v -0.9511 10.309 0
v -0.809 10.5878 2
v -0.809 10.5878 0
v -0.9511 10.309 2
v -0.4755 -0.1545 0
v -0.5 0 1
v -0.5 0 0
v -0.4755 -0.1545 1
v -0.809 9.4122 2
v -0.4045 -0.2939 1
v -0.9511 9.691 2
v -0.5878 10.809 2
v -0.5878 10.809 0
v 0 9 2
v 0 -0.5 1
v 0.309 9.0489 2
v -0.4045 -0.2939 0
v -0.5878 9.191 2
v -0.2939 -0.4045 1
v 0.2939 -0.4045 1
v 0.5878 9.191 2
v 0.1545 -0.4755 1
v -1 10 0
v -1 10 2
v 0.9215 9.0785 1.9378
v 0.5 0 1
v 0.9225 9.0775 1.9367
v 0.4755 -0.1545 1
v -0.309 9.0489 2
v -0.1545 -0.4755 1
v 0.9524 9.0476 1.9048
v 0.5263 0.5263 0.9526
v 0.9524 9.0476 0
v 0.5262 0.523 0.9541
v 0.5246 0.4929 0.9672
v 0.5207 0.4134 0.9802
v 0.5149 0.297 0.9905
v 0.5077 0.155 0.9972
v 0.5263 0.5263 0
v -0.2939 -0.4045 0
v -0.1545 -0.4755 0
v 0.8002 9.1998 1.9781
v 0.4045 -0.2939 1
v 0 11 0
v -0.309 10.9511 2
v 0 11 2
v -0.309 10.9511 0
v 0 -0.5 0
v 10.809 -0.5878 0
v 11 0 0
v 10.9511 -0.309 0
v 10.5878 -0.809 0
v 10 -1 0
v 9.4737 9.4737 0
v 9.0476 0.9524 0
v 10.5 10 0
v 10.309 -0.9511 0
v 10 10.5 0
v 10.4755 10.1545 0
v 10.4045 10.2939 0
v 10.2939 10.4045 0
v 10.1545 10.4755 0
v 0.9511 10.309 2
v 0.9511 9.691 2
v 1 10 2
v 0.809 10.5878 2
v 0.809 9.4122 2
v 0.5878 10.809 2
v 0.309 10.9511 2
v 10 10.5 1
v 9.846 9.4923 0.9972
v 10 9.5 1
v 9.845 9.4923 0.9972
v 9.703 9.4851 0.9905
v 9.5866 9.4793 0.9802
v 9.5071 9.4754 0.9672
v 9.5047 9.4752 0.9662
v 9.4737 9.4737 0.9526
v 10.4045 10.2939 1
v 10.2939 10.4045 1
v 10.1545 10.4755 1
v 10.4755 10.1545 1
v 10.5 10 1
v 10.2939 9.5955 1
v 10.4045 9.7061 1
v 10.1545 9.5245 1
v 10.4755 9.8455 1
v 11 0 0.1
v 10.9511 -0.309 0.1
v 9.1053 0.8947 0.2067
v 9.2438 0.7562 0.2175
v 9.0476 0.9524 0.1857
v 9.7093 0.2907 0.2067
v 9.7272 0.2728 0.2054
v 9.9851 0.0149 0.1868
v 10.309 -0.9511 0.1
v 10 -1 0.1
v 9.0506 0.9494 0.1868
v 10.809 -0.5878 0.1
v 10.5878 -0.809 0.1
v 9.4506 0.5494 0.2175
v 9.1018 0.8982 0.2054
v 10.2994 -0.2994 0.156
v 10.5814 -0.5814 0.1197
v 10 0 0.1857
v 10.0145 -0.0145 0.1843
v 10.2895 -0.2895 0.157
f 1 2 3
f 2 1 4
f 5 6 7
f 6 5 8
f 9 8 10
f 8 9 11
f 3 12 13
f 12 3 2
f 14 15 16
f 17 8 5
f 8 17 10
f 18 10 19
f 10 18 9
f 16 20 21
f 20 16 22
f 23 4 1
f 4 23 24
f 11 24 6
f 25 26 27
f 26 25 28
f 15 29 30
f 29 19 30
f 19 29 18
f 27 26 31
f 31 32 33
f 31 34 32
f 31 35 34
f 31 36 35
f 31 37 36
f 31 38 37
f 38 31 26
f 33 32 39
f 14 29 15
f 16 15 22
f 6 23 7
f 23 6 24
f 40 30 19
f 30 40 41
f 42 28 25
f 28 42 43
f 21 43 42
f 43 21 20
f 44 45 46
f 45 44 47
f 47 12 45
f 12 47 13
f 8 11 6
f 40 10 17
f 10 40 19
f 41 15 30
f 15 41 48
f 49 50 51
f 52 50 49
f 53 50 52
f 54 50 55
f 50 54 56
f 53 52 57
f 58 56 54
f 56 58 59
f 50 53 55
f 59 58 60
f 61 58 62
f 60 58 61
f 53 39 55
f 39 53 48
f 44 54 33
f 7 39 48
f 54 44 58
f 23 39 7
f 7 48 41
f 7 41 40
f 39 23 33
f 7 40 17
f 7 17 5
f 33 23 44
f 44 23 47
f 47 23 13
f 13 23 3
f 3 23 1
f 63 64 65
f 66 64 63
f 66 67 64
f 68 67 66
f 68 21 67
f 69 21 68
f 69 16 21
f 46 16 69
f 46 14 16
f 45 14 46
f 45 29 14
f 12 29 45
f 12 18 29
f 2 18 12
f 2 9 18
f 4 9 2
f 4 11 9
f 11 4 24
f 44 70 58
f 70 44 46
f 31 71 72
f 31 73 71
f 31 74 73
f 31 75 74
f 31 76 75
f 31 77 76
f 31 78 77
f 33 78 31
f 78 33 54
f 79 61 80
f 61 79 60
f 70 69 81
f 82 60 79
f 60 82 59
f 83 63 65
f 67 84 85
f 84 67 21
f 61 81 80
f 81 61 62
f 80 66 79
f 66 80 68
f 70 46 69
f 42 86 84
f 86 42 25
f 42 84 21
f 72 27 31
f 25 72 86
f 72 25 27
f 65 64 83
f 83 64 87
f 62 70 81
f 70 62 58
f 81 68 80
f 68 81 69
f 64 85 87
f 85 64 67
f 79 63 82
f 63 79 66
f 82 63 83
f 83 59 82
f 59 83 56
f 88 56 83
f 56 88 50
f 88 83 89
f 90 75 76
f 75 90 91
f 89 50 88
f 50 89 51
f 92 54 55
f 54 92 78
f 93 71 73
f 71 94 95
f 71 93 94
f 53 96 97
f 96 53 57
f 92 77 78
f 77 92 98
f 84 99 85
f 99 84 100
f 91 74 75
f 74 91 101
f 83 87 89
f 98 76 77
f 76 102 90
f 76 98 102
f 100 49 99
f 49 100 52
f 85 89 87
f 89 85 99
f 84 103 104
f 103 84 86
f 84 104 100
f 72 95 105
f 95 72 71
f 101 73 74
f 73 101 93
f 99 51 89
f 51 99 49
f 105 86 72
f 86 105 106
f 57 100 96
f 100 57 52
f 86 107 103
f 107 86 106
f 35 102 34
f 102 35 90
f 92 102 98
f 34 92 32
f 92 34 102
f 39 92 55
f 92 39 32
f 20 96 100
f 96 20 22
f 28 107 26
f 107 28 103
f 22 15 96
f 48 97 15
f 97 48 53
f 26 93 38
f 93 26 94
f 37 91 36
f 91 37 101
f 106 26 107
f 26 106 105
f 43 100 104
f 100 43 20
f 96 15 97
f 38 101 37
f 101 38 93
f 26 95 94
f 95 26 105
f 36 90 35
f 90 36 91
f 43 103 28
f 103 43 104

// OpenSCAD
module hull_chain(close=false) {
    union () {
        for (i = [0 : $children - 2]) {
            hull() {
                children(i);
                children(i+1);
            }
        }
        hull() {
            if (close) {
                children(0);
                children($children - 1);
            }
        }
    }
}

hull_chain(true) {
    $fn=20;
    cylinder(d = 1);
    
    translate([0, 10, 0]) {
        cylinder(d = 2, h=2);
    }
    translate([10, 10, 0]) {
        cylinder(d = 1);
    }
    translate([10, 0, 0]) {
        cylinder(d = 2, h = 0.1);
    }
}
